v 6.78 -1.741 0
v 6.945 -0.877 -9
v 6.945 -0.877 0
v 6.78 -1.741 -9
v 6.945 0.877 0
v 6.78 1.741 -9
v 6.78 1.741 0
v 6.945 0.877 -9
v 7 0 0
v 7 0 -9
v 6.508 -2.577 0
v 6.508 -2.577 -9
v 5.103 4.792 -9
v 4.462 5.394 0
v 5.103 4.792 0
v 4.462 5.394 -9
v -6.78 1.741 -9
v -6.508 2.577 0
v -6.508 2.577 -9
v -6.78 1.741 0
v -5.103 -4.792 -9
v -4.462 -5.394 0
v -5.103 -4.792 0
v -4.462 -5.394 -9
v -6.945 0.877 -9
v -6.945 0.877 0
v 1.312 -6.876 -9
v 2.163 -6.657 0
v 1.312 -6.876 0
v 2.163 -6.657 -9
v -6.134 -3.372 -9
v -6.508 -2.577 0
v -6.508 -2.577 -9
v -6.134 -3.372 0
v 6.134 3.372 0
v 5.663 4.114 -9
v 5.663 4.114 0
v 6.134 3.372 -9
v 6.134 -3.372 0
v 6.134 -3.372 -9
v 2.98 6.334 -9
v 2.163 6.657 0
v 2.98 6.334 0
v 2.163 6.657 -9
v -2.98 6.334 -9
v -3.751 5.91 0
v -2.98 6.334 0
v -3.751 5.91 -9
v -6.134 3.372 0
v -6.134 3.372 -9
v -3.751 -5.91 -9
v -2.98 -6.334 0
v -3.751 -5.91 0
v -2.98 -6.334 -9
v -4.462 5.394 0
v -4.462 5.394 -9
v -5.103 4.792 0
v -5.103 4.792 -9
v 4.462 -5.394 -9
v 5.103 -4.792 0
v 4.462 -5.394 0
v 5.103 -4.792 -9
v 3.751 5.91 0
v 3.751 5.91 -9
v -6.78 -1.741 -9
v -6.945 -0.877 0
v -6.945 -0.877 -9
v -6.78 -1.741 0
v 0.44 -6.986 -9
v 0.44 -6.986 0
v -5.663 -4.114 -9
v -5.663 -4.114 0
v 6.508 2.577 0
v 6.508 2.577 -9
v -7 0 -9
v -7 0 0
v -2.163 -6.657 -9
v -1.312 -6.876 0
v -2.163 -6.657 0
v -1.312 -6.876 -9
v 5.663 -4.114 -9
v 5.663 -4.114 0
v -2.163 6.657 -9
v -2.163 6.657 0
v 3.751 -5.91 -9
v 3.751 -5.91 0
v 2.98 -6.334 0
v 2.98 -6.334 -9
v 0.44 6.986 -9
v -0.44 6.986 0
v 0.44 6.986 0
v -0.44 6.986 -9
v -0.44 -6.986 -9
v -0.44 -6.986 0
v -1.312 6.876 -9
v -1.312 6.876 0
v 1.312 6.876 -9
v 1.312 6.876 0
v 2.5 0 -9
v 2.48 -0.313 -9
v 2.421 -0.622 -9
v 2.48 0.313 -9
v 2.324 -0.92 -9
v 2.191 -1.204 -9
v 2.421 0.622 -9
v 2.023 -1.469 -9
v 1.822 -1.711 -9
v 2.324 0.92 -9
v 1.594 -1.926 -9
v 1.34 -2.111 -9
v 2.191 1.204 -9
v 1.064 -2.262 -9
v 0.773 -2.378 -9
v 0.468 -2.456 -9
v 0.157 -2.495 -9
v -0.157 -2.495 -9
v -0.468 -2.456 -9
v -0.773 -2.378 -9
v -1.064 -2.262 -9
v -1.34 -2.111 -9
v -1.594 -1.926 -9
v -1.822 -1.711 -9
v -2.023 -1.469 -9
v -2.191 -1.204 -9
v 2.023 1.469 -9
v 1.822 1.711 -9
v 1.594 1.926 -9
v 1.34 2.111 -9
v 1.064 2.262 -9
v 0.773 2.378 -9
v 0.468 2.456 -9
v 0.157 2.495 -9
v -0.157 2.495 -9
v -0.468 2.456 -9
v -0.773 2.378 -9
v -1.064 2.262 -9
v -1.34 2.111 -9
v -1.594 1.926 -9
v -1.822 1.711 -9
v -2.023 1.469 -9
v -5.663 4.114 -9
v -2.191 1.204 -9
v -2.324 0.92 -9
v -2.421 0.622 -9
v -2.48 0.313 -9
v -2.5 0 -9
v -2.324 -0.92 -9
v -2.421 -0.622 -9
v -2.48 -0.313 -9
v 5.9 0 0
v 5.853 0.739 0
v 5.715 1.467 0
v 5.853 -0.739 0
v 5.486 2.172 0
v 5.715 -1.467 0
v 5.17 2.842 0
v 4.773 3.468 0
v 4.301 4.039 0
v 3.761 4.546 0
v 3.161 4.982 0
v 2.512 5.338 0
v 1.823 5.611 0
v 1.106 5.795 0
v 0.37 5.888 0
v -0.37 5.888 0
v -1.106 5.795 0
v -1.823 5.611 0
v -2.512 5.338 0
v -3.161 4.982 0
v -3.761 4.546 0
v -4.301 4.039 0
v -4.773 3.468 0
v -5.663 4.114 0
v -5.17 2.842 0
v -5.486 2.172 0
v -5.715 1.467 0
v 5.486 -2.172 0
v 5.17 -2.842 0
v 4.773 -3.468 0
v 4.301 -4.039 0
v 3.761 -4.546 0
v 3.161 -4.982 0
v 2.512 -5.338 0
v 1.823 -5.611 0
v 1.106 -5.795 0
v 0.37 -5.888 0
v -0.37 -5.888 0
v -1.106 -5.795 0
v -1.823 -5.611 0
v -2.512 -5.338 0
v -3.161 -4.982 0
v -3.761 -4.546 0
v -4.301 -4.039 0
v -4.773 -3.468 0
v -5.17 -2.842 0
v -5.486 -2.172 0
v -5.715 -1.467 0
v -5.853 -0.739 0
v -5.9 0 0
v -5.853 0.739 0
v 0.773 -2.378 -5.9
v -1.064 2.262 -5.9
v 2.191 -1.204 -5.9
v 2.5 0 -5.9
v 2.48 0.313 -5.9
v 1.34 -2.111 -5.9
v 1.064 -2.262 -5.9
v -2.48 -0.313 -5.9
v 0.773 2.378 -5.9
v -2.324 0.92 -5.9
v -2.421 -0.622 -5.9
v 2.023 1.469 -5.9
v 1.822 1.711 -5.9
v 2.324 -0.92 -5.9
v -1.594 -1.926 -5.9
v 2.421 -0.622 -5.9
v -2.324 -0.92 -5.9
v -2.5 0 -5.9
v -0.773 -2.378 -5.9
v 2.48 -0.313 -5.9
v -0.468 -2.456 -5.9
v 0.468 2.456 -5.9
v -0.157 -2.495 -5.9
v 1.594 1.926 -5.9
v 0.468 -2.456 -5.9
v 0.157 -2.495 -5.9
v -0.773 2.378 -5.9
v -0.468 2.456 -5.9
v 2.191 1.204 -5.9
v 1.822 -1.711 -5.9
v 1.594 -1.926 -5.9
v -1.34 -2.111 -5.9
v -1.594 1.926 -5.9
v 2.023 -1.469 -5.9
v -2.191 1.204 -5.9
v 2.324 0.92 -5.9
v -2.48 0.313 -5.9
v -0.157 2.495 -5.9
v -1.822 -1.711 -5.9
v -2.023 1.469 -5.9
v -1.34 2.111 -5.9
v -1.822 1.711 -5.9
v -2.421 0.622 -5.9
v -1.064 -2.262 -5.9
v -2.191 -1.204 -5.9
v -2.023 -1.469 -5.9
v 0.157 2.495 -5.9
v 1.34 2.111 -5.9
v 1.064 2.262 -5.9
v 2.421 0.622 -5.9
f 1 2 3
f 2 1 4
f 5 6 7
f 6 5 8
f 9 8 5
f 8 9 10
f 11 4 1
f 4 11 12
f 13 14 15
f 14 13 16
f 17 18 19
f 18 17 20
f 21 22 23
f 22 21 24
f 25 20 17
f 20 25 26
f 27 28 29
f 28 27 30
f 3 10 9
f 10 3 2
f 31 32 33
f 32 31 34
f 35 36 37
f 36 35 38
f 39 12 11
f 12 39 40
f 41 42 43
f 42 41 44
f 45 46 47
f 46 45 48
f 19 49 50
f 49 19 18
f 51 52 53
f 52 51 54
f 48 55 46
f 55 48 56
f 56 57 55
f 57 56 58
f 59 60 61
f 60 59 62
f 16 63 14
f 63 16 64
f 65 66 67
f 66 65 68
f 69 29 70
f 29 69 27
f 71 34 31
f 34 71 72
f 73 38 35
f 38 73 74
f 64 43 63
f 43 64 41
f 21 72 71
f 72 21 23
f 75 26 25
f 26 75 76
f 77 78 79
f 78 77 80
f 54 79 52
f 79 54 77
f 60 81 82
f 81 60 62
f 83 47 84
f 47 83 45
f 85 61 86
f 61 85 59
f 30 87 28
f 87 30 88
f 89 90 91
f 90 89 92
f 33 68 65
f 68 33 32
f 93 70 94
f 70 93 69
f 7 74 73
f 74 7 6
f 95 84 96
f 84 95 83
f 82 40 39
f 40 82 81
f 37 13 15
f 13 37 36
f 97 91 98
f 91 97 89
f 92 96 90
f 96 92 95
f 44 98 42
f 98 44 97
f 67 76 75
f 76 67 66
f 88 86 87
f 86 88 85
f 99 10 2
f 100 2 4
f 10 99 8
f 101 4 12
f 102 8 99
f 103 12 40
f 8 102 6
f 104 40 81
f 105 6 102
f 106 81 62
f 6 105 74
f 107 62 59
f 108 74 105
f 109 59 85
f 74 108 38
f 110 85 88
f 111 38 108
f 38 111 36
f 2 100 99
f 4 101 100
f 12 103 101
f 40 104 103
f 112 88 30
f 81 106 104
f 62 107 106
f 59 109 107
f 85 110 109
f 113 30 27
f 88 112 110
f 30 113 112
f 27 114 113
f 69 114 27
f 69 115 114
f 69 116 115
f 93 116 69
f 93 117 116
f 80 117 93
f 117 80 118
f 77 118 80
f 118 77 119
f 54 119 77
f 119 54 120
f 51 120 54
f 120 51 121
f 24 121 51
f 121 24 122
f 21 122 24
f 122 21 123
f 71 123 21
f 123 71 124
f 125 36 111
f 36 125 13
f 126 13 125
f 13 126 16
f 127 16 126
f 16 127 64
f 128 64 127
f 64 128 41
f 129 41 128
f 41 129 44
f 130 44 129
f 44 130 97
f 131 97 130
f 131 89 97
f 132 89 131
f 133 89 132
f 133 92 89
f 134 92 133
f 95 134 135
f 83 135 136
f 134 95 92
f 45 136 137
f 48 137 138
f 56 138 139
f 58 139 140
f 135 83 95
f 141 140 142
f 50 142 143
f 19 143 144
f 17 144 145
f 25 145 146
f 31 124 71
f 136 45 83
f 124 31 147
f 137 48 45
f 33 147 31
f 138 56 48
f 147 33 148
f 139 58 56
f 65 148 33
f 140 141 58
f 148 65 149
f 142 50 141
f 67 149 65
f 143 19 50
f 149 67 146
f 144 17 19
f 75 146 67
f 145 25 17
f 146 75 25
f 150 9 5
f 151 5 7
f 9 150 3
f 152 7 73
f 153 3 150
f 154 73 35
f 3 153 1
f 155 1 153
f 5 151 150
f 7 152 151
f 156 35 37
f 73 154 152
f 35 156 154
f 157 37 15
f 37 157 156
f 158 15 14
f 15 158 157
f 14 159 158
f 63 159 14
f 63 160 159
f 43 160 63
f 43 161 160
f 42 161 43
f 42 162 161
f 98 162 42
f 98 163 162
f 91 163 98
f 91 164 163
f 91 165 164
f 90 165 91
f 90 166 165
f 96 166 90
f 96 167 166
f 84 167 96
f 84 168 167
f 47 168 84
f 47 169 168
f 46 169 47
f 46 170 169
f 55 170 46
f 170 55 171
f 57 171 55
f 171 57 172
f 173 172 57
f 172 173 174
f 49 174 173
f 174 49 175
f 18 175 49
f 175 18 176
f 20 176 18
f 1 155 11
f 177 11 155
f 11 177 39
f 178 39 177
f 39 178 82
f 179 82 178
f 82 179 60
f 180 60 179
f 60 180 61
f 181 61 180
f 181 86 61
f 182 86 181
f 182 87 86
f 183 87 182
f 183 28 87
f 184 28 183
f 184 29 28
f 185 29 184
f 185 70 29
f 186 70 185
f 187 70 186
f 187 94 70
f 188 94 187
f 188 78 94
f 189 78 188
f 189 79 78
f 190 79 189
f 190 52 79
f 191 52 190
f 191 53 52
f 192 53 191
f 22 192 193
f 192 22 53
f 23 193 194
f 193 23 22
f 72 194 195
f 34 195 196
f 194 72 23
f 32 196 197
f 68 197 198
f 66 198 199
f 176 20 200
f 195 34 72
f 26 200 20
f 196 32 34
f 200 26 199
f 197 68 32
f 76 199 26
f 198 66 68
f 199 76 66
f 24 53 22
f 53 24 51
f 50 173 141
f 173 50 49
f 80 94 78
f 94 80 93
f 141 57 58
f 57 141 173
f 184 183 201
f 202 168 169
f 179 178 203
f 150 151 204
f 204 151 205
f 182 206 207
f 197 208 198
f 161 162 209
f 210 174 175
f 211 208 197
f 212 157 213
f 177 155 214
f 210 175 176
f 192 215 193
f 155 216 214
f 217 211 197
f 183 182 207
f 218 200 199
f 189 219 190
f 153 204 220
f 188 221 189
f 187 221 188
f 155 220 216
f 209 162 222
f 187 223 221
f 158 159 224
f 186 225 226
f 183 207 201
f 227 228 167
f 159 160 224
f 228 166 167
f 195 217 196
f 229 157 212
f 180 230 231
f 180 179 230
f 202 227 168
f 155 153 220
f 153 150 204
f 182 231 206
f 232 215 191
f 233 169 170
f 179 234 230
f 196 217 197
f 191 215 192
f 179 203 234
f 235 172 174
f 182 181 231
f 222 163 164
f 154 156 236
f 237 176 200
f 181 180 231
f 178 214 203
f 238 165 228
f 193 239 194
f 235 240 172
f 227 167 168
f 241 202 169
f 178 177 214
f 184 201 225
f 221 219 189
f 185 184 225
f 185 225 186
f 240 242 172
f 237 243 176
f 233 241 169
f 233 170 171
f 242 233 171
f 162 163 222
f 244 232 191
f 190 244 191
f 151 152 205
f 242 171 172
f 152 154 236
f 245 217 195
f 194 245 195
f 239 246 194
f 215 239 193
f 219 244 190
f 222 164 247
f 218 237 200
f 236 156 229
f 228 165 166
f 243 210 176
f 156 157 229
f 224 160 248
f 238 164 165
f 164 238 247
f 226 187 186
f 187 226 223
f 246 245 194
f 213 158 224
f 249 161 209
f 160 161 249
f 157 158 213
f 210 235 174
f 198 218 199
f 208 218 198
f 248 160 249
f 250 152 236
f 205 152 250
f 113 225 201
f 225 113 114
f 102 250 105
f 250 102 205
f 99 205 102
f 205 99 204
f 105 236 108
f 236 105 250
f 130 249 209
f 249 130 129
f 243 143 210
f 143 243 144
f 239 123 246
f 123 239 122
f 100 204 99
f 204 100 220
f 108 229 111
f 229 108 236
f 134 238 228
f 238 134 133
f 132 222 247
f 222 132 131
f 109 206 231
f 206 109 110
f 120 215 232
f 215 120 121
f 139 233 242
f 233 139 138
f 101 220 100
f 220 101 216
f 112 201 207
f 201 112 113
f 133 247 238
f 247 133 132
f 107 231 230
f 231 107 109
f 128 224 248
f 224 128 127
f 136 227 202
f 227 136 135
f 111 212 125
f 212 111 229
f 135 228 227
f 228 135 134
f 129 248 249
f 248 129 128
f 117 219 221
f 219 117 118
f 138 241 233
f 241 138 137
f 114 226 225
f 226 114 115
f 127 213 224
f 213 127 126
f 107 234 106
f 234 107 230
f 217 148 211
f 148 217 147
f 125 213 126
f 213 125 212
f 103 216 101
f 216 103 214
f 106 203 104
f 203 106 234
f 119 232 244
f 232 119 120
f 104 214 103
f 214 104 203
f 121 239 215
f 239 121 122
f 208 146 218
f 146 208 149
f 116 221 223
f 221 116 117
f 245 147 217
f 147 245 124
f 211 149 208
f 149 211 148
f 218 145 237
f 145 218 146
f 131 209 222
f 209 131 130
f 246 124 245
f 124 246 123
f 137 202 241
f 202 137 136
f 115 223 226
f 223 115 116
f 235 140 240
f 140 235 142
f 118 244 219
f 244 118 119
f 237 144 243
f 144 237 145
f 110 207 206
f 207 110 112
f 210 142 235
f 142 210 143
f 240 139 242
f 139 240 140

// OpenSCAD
$fn = 50;


difference() {
	union() {
		translate(v = [0, 0, -9.0000000000]) {
			cylinder(h = 9, r = 7.0000000000);
		}
		translate(v = [0, 0, -9.0000000000]) {
			cylinder(h = 9, r = 2.8750000000);
		}
	}
	union() {
		translate(v = [0, 0, 0]) {
			rotate(a = [0, 0, 0]) {
				difference() {
					union() {
						#translate(v = [0, 0, -9.0000000000]) {
							cylinder(h = 9, r = 2.2500000000);
						}
						#translate(v = [0, 0, -5.9000000000]) {
							cylinder(h = 5.9000000000, r1 = 2.5000000000, r2 = 5.9000000000);
						}
						#translate(v = [0, 0, -9.0000000000]) {
							cylinder(h = 9, r = 2.5000000000);
						}
						#translate(v = [0, 0, -9.0000000000]) {
							cylinder(h = 9, r = 2.2500000000);
						}
					}
					union();
				}
			}
		}
	}
}
